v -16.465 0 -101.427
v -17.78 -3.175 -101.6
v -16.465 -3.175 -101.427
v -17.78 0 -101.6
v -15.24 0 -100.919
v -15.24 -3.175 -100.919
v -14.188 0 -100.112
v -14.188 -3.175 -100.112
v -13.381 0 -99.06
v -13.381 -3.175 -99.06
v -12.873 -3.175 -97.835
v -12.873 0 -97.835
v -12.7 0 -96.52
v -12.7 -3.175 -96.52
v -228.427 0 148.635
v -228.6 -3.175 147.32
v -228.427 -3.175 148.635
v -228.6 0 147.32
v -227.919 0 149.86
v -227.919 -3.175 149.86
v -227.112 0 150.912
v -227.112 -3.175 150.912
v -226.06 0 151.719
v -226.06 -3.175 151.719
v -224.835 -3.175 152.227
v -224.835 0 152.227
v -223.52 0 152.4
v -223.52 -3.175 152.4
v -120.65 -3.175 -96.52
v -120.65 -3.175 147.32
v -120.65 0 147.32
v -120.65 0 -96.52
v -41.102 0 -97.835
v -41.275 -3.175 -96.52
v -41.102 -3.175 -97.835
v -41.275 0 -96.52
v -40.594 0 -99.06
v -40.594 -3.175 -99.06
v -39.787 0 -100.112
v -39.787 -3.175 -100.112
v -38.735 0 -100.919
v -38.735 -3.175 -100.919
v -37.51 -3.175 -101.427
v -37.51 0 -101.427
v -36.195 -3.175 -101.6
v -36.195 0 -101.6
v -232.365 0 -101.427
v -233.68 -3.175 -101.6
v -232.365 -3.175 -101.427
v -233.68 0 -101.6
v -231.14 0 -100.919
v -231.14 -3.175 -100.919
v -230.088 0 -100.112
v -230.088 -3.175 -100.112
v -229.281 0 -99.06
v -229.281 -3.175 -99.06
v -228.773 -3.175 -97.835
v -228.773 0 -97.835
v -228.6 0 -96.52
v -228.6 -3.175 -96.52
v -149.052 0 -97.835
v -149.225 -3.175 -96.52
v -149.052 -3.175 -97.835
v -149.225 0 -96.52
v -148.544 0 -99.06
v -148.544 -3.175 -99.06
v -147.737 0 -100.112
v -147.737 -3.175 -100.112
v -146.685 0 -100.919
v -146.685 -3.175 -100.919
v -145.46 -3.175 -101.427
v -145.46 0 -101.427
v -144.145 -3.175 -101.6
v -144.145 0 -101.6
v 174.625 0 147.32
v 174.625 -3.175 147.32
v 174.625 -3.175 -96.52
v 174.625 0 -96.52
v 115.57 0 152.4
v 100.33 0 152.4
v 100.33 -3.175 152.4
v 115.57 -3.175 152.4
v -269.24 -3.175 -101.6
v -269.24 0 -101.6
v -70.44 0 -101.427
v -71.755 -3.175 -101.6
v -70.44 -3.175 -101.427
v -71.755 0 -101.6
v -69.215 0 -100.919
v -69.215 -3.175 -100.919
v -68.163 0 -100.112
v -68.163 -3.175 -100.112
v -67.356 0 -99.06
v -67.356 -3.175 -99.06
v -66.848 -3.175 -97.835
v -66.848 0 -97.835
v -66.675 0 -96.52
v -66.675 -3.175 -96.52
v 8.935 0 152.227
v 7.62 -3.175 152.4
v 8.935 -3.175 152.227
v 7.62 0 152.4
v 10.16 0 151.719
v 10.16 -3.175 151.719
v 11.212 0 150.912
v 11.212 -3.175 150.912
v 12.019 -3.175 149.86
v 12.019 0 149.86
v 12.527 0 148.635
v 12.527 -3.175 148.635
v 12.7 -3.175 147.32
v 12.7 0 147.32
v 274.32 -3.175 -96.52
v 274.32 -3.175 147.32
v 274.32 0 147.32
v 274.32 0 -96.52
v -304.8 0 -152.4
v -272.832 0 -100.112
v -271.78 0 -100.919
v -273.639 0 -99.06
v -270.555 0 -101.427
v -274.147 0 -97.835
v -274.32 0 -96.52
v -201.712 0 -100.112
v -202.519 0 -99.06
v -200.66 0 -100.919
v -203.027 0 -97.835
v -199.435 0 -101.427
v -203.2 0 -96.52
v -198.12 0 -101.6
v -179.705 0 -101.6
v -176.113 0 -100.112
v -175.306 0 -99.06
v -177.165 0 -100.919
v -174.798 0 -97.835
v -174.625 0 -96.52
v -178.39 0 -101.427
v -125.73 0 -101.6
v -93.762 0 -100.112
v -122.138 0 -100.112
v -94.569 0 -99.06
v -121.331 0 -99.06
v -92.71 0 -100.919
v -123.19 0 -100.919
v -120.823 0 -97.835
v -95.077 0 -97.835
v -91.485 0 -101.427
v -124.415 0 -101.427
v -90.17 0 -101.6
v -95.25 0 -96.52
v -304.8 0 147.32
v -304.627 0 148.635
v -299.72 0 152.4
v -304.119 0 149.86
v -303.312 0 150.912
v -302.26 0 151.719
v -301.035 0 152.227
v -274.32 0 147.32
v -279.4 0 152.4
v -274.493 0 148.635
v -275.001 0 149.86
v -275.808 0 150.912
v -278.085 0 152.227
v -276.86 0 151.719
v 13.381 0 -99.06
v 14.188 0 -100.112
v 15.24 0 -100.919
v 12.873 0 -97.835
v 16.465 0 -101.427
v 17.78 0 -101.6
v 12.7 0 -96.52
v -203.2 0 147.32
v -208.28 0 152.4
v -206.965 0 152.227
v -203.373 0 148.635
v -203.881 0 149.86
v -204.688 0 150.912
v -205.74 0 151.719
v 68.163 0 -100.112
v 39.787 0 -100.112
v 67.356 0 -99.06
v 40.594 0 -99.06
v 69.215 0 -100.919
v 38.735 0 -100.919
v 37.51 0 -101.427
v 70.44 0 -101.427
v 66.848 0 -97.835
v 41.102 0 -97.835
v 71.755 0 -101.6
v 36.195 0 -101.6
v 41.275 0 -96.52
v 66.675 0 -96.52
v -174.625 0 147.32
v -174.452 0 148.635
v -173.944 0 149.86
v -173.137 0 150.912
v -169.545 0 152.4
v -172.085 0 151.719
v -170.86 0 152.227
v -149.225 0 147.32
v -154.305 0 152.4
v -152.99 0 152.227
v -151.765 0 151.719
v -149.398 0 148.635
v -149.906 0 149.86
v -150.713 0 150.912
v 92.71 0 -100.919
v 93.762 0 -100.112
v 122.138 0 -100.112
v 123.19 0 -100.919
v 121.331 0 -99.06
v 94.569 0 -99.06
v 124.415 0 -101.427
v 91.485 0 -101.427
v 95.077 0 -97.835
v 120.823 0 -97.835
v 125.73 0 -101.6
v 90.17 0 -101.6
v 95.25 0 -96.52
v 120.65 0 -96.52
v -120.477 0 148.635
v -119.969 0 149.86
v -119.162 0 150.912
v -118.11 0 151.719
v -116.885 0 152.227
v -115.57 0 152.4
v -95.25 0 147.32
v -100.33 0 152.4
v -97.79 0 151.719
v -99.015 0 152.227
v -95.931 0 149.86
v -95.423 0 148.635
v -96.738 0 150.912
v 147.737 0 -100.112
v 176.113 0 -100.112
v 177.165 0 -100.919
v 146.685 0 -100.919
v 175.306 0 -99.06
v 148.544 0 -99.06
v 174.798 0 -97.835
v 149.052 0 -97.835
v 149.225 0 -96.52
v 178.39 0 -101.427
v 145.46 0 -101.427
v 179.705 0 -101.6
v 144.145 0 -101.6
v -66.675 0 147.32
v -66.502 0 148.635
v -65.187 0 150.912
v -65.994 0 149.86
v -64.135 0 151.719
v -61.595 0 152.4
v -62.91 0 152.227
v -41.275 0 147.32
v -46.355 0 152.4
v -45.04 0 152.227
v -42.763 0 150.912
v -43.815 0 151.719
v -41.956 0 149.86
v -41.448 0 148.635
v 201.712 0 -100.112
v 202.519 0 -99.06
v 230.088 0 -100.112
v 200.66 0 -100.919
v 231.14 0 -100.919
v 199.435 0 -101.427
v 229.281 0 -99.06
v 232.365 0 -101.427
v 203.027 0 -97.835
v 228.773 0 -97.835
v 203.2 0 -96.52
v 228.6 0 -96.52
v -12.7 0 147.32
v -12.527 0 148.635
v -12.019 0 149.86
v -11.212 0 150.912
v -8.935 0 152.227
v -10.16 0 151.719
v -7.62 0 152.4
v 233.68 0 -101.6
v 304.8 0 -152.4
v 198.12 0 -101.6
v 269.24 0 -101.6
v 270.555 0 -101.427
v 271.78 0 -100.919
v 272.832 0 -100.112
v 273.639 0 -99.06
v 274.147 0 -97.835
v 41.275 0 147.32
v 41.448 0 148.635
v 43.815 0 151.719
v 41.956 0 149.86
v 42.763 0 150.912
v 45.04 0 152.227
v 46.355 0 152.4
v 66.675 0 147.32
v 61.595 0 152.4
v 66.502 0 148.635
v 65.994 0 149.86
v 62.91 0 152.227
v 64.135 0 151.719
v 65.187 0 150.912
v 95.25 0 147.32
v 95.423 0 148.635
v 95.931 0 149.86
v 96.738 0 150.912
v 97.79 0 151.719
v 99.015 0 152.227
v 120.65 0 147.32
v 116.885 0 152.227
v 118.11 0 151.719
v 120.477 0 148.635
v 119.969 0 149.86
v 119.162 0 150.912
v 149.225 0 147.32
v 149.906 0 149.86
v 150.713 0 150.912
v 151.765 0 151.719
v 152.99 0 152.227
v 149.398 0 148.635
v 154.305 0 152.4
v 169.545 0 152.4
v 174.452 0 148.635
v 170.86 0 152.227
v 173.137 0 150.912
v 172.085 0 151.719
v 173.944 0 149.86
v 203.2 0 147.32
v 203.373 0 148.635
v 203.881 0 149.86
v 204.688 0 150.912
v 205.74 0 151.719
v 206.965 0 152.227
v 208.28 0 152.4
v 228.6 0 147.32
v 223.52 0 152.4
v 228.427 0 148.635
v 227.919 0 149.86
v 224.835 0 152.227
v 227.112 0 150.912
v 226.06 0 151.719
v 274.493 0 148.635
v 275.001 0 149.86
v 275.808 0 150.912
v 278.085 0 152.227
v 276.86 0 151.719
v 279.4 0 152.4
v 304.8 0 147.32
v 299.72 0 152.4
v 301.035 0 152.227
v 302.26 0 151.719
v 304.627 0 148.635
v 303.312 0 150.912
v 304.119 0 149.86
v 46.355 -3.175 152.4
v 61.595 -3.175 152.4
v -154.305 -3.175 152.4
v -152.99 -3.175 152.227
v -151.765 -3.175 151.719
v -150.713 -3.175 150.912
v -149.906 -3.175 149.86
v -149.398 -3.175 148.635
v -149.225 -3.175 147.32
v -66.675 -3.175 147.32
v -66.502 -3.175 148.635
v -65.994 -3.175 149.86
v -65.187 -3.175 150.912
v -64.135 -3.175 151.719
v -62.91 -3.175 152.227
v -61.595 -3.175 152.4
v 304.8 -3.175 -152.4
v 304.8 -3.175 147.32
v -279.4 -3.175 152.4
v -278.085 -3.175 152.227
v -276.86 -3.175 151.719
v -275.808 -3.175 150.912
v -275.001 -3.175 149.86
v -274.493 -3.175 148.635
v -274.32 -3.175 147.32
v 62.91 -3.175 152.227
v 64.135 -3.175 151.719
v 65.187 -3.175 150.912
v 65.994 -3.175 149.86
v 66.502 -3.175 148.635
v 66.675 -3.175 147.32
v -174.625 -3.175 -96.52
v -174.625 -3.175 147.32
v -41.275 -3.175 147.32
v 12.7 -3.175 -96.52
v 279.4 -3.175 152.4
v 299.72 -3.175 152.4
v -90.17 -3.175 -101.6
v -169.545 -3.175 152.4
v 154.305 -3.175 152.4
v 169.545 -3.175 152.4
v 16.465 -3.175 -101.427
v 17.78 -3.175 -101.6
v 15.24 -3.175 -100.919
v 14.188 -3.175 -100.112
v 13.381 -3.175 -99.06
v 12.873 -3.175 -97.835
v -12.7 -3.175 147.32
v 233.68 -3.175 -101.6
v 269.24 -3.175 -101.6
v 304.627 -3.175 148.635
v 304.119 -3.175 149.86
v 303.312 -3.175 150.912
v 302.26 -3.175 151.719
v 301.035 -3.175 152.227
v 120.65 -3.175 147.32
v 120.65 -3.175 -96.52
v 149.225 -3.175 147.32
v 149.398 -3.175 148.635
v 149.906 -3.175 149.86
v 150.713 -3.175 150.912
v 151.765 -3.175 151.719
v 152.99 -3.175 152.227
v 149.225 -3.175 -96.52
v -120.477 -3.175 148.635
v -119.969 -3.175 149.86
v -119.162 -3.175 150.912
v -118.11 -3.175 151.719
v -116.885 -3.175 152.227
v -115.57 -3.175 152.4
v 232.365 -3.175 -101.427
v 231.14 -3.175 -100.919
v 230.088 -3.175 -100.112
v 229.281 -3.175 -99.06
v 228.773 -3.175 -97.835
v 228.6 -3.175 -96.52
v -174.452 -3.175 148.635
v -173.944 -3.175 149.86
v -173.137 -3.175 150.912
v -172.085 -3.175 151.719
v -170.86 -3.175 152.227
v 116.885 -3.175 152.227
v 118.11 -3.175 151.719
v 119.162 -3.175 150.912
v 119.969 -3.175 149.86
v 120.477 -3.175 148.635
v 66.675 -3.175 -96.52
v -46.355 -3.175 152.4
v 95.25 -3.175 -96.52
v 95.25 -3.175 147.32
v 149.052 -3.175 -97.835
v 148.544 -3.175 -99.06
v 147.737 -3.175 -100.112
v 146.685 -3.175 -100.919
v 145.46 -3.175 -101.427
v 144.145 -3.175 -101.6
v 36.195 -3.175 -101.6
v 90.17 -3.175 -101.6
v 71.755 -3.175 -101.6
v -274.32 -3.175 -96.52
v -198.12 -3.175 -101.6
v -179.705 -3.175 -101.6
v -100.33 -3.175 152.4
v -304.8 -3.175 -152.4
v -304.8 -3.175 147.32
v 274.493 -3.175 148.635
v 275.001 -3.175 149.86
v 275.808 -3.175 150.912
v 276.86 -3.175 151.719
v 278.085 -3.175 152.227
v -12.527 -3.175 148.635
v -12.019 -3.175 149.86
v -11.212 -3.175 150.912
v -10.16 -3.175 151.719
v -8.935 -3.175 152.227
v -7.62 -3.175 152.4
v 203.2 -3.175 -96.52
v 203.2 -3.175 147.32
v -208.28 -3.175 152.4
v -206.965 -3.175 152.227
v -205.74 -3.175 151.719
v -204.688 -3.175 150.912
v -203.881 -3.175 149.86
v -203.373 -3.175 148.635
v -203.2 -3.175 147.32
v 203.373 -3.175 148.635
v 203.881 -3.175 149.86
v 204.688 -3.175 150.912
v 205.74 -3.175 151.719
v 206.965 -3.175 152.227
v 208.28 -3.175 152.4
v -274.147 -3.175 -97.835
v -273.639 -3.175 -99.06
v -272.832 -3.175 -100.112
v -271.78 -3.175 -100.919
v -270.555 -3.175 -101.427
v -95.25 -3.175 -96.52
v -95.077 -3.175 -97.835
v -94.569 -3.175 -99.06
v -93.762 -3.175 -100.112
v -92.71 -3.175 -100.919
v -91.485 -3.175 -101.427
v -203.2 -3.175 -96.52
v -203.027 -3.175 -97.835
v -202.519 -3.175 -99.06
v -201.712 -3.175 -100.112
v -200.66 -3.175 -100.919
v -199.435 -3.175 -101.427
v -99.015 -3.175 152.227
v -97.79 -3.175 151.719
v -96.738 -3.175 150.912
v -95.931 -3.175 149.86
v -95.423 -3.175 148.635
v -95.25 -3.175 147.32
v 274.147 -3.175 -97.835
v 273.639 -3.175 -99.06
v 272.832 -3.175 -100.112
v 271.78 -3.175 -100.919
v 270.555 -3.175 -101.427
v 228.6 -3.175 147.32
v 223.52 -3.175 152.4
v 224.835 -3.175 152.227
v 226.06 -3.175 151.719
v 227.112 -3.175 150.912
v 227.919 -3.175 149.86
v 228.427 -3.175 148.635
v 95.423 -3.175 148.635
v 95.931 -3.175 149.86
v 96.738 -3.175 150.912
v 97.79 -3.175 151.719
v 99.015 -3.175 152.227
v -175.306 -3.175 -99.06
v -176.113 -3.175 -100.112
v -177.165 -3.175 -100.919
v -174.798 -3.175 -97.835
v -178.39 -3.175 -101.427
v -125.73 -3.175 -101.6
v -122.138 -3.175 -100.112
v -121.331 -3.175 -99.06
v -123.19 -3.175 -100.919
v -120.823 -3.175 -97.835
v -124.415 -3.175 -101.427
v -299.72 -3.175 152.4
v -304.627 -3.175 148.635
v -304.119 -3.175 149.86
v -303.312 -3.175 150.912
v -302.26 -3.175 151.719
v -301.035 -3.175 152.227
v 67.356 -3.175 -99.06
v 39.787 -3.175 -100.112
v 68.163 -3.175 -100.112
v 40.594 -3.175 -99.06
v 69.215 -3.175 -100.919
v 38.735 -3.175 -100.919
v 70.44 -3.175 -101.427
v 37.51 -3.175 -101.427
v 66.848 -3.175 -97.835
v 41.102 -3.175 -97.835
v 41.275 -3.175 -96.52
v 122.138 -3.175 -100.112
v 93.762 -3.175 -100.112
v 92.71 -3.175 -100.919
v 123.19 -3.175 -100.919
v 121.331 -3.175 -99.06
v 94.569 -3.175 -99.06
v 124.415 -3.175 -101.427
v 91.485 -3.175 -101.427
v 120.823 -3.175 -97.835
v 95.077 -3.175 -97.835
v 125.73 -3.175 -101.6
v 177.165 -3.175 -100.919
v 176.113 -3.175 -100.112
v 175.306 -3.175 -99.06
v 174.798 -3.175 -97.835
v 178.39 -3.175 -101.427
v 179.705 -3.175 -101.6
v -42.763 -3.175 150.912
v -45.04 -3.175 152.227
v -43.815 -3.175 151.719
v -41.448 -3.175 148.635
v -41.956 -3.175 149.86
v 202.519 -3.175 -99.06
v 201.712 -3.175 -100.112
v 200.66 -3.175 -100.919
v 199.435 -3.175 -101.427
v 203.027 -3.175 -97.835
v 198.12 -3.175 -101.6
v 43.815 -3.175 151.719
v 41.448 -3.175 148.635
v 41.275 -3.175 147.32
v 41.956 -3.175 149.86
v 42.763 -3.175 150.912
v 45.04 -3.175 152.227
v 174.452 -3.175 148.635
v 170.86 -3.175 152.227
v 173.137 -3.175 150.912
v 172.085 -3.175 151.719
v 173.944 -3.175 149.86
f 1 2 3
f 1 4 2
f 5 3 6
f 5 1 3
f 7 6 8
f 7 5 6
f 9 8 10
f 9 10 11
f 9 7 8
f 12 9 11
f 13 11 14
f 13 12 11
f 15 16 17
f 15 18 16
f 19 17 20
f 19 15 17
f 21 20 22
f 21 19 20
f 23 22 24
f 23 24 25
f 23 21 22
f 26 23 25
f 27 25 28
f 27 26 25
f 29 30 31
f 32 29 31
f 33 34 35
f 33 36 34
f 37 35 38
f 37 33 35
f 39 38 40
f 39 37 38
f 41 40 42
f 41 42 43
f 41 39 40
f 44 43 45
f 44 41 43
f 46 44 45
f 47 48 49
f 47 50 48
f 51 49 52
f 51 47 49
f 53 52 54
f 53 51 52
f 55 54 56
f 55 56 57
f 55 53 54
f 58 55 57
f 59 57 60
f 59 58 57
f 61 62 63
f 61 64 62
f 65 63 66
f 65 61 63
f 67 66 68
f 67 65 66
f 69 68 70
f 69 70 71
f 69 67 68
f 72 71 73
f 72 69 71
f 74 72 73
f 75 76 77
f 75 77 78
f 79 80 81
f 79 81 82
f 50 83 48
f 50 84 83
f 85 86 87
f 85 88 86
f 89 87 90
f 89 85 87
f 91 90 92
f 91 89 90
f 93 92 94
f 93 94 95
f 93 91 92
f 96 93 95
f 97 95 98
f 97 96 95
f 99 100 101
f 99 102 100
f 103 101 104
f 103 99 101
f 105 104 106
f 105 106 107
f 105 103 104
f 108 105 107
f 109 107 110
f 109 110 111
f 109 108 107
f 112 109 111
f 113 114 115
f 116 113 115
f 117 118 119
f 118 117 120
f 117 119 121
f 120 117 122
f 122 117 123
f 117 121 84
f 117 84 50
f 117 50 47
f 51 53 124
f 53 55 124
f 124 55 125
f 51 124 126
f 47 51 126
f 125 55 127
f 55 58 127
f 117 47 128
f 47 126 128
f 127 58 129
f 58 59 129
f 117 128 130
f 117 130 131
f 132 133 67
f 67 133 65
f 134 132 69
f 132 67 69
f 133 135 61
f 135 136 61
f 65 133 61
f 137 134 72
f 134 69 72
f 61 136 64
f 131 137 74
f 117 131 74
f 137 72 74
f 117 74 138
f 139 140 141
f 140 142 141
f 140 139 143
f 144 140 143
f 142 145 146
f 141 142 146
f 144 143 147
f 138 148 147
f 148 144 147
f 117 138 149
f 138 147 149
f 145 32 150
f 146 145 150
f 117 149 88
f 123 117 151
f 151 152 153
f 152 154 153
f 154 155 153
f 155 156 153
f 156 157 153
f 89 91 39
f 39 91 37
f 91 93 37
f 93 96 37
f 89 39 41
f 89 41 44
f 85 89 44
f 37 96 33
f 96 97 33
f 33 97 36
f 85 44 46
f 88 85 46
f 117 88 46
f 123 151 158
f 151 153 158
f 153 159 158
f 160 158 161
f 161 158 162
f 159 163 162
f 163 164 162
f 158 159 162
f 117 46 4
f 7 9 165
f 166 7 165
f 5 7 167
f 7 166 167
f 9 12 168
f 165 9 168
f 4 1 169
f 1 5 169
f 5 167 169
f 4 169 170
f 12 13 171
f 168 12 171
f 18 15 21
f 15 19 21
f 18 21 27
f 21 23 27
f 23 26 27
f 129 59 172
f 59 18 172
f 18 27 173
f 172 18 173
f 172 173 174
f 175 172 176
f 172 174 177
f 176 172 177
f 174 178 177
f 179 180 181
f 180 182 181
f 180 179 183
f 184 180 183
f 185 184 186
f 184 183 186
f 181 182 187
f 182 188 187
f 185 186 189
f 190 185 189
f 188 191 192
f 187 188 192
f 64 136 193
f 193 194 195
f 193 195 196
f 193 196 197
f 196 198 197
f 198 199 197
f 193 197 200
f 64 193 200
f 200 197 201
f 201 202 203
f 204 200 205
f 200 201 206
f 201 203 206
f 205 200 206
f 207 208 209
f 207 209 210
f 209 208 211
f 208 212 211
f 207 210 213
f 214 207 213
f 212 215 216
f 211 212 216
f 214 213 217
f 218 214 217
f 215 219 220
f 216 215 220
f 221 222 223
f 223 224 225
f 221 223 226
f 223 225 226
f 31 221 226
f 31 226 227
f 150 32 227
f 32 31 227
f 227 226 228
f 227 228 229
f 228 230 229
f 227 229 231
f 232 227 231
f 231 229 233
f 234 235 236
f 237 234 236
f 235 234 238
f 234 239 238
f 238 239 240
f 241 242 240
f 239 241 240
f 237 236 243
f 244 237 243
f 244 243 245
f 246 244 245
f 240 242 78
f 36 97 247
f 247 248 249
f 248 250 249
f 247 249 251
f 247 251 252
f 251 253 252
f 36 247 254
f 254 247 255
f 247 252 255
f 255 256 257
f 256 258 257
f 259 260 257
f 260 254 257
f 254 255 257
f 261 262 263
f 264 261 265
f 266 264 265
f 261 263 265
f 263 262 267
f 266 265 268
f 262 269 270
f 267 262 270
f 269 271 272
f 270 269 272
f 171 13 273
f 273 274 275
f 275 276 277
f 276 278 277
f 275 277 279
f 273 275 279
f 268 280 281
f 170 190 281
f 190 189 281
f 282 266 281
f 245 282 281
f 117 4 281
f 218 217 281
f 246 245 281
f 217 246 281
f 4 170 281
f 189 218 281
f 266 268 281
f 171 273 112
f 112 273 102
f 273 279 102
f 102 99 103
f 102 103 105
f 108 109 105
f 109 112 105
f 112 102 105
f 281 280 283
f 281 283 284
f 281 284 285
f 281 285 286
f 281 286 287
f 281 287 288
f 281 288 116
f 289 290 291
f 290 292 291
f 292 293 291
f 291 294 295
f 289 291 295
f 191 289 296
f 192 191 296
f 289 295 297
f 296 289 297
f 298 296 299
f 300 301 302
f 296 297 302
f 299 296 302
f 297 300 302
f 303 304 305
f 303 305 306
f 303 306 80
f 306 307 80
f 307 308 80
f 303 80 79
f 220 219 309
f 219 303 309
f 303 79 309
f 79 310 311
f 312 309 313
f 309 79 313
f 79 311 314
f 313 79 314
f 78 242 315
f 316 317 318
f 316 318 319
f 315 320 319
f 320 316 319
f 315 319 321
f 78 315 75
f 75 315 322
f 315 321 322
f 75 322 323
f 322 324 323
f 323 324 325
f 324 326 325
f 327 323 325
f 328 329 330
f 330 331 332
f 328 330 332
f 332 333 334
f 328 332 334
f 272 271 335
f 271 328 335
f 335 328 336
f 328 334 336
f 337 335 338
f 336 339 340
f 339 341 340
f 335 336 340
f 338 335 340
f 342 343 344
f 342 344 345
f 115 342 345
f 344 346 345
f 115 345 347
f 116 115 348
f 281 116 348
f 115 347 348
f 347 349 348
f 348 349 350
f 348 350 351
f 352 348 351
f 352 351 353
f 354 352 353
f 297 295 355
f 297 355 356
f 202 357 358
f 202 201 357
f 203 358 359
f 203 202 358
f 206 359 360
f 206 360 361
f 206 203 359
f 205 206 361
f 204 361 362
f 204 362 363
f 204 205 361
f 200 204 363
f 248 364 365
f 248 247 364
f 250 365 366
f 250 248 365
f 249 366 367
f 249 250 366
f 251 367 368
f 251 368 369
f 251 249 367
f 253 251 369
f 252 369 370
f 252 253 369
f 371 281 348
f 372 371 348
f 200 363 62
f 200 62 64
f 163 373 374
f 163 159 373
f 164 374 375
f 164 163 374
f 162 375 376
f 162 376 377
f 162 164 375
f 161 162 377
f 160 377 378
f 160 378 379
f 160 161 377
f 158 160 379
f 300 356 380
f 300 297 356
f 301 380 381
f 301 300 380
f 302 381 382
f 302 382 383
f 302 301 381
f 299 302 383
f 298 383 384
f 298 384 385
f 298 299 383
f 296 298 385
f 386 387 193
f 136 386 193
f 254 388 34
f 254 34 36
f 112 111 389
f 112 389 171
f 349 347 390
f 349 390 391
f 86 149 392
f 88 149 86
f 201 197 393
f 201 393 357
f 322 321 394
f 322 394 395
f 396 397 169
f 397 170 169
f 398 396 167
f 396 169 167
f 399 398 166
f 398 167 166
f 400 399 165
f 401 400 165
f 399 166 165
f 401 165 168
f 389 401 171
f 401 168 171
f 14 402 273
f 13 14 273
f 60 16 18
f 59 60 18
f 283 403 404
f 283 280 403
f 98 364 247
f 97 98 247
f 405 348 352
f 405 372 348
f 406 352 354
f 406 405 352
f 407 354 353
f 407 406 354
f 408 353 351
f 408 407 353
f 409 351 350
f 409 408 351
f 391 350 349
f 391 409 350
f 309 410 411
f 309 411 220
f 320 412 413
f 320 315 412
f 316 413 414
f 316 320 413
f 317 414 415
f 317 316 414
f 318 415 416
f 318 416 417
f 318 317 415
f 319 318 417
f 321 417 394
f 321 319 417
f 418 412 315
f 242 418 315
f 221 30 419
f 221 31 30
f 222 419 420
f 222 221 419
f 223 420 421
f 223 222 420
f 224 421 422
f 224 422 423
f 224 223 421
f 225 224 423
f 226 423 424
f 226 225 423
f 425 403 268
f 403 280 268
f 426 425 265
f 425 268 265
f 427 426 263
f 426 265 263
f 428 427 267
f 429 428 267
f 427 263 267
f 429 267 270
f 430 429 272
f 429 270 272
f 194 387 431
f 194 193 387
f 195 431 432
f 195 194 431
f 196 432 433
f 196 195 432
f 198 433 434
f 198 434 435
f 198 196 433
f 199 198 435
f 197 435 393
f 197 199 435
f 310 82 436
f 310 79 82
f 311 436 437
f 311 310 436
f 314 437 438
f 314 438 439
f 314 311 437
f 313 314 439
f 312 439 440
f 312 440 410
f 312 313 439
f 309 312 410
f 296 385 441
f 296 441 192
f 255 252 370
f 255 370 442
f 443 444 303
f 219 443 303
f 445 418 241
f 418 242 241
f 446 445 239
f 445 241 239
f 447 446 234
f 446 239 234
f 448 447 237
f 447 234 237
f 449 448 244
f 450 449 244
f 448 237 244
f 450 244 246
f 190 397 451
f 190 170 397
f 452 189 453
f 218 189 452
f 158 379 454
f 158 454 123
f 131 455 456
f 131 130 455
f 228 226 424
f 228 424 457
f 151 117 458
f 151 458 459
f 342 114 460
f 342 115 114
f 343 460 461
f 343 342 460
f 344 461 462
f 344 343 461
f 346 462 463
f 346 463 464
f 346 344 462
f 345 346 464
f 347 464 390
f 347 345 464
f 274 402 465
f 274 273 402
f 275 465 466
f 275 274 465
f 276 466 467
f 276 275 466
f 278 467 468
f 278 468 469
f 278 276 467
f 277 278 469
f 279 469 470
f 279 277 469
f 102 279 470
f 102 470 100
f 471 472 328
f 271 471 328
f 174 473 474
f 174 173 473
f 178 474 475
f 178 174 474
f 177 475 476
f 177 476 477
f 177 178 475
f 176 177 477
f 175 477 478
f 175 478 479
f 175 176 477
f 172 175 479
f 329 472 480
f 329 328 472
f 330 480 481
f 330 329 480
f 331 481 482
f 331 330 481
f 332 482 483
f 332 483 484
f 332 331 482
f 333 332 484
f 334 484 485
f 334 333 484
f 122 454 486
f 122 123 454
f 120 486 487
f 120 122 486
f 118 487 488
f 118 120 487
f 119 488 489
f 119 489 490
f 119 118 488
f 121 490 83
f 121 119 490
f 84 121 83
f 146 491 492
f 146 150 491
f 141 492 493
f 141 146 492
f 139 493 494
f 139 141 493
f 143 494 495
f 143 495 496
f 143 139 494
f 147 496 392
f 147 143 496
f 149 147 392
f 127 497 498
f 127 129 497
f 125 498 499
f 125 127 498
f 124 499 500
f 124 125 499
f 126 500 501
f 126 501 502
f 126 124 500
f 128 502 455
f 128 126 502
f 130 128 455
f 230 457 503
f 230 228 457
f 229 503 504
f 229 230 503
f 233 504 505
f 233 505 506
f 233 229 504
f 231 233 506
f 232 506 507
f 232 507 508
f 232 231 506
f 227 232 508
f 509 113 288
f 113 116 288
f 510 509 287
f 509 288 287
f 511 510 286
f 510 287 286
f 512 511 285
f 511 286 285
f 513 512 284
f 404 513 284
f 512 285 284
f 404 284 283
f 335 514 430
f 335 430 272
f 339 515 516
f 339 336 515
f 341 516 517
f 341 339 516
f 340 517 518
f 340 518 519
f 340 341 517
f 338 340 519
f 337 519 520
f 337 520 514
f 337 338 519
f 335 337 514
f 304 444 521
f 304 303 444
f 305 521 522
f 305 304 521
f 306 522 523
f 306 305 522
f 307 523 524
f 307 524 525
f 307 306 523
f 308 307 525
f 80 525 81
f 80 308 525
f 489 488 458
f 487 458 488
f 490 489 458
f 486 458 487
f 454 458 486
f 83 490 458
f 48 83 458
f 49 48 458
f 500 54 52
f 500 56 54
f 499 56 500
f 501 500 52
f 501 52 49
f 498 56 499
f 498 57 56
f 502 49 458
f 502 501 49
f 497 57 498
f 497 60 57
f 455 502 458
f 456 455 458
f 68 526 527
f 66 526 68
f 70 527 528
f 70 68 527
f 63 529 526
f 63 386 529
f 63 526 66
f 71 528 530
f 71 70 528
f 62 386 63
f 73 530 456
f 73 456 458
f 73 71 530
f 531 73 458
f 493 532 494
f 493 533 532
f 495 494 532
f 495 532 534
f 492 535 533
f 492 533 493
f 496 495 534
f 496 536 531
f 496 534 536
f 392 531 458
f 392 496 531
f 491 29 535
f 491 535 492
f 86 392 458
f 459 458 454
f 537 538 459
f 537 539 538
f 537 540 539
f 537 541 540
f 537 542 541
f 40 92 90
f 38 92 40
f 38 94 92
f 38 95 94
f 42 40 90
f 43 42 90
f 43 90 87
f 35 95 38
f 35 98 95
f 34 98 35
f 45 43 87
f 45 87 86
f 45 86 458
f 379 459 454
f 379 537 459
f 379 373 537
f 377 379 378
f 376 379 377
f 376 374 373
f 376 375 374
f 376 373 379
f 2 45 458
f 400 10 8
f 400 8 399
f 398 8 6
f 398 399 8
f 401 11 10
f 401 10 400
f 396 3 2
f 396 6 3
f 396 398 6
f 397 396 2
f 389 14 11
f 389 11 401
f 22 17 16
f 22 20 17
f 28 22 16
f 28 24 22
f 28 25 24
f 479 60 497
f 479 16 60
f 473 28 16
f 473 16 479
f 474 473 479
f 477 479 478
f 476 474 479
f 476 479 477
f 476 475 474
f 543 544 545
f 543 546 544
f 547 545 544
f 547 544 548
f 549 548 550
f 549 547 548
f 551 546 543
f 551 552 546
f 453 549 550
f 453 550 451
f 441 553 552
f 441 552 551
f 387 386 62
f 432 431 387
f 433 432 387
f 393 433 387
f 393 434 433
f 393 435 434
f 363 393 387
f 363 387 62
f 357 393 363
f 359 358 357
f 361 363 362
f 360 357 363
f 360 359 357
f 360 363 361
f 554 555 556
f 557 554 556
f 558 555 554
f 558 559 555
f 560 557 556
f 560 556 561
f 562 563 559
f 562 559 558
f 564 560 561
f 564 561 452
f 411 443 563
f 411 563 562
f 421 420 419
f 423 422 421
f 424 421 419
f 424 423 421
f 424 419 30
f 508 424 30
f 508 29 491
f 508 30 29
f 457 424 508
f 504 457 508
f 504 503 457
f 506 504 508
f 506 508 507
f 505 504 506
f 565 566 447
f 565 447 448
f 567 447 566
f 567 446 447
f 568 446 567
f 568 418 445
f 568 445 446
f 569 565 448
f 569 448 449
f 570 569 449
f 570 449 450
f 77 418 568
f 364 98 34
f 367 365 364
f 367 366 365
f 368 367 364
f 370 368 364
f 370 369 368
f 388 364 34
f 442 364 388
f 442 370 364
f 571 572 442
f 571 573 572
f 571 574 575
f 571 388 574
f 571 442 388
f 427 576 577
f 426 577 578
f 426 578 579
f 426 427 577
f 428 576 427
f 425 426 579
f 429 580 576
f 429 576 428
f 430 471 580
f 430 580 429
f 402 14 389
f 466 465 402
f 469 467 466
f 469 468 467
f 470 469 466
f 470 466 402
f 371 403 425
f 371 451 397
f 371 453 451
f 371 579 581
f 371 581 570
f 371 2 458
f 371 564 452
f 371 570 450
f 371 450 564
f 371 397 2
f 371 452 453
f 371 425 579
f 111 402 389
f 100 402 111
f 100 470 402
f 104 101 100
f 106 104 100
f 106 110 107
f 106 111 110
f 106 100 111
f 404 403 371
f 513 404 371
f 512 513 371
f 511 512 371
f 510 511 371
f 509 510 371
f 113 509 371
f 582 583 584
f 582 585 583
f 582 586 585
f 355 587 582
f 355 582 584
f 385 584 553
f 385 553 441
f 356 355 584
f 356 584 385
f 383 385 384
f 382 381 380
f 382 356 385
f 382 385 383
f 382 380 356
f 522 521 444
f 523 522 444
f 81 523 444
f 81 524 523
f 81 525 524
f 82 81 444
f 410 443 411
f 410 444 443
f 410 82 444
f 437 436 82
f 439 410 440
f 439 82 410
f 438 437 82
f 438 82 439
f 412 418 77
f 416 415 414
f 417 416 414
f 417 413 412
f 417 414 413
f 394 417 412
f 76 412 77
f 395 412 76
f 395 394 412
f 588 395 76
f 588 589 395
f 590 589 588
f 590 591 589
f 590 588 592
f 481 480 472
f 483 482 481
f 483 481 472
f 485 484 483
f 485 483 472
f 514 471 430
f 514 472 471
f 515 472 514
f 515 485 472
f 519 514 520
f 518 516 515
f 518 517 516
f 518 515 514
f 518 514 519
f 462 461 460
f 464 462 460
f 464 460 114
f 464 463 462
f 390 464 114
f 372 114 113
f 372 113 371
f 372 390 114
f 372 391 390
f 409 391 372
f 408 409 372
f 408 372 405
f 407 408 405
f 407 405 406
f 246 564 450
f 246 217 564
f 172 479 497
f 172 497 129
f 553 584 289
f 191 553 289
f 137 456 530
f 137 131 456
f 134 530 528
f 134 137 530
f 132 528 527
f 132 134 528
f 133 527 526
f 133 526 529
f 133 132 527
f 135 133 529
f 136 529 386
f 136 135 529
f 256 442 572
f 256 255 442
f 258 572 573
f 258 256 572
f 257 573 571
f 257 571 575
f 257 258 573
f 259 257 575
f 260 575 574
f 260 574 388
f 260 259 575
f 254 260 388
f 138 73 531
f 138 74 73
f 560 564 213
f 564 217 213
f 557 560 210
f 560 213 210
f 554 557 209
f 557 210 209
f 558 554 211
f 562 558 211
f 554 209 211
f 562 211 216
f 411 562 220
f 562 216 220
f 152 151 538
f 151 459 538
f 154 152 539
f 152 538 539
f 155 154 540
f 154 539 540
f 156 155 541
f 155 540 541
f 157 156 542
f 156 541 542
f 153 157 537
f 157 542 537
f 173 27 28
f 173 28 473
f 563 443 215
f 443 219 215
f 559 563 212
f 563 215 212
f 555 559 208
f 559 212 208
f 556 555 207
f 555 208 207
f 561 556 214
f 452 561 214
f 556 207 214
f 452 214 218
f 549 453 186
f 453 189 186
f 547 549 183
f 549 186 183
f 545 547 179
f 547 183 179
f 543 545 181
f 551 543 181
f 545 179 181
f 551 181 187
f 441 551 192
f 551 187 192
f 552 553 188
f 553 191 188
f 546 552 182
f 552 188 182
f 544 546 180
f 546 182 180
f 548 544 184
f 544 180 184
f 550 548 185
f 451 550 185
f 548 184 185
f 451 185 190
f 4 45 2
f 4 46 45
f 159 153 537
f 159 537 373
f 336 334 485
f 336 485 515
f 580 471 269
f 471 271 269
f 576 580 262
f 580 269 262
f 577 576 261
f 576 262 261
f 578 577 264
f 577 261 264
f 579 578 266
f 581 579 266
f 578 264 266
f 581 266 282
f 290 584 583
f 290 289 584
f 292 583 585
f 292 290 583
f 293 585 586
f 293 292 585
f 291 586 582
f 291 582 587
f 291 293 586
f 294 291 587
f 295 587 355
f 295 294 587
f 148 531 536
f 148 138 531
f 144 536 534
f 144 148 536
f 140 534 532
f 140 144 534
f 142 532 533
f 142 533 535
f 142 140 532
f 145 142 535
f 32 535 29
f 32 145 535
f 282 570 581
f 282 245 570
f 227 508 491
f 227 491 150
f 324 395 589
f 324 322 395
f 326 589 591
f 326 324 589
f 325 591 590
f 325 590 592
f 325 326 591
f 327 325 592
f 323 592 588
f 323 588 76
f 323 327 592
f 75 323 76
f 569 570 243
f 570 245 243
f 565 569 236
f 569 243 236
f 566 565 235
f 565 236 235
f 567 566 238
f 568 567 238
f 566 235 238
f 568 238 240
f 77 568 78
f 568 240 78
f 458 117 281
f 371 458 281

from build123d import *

# Parameters (mm, degrees)
F0_W     = 609.6
F0_H     = 304.8
F1_DEPTH = 3.175
F2_W     = 45.72
F2_H     = 3.175
F2_W_2   = 28.575
F3_DEPTH = 254
F4_R     = 5.08
F5_R     = 5.08


with BuildPart() as f1:
    # F0 (on Front) → F1 (new body)
    with BuildSketch(Plane.XZ):
        Rectangle(F0_W, F0_H)
    extrude(amount=F1_DEPTH)

    # F2 (on face) → F3 (cut)
    with BuildSketch(Plane.XY.offset(152.4)):
        with Locations((-251.46, -1.5875)):
            Rectangle(F2_W, F2_H)
        with Locations((-188.9125, -1.5875)):
            Rectangle(F2_W_2, F2_H)
        with Locations((-134.9375, -1.5875)):
            Rectangle(F2_W_2, F2_H)
        with Locations((-80.9625, -1.5875)):
            Rectangle(F2_W_2, F2_H)
        with Locations((-26.9875, -1.5875)):
            Rectangle(F2_W_2, F2_H)
        with Locations((26.9875, -1.5875)):
            Rectangle(F2_W_2, F2_H)
        with Locations((80.9625, -1.5875)):
            Rectangle(F2_W_2, F2_H)
        with Locations((134.9375, -1.5875)):
            Rectangle(F2_W_2, F2_H)
        with Locations((188.9125, -1.5875)):
            Rectangle(F2_W_2, F2_H)
        with Locations((251.46, -1.5875)):
            Rectangle(F2_W, F2_H)
    extrude(amount=-F3_DEPTH, mode=Mode.SUBTRACT)

    # F4
    f4_edges = [f1.edges().sort_by_distance(p)[0] for p in [
        (-274.32, -1.5875, 152.4),
        (-228.6, -1.5875, 152.4),
        (-228.6, -1.5875, -101.6),
        (-274.32, -1.5875, -101.6),
        (-304.8, -1.5875, 152.4),
        (304.8, -1.5875, 152.4),
        (-203.2, -1.5875, 152.4),
        (-174.625, -1.5875, 152.4),
        (-149.225, -1.5875, 152.4),
        (-120.65, -1.5875, 152.4),
        (-95.25, -1.5875, 152.4),
        (-66.675, -1.5875, 152.4),
        (-41.275, -1.5875, 152.4),
        (-12.7, -1.5875, 152.4),
        (12.7, -1.5875, 152.4),
        (66.675, -1.5875, 152.4),
        (95.25, -1.5875, 152.4),
        (149.225, -1.5875, 152.4),
        (41.275, -1.5875, 152.4),
        (120.65, -1.5875, 152.4),
        (174.625, -1.5875, 152.4),
        (228.6, -1.5875, 152.4),
        (274.32, -1.5875, 152.4),
        (203.2, -1.5875, 152.4),
    ]]
    fillet(f4_edges, radius=F4_R)

    # F5
    f5_edges = [f1.edges().sort_by_distance(p)[0] for p in [
        (-174.625, -1.5875, -101.6),
        (-120.65, -1.5875, -101.6),
        (-66.675, -1.5875, -101.6),
        (-12.7, -1.5875, -101.6),
        (41.275, -1.5875, -101.6),
        (95.25, -1.5875, -101.6),
        (149.225, -1.5875, -101.6),
        (203.2, -1.5875, -101.6),
        (274.32, -1.5875, -101.6),
        (228.6, -1.5875, -101.6),
        (174.625, -1.5875, -101.6),
        (120.65, -1.5875, -101.6),
        (66.675, -1.5875, -101.6),
        (12.7, -1.5875, -101.6),
        (-41.275, -1.5875, -101.6),
        (-95.25, -1.5875, -101.6),
        (-149.225, -1.5875, -101.6),
        (-203.2, -1.5875, -101.6),
    ]]
    fillet(f5_edges, radius=F5_R)


solid = f1.part
